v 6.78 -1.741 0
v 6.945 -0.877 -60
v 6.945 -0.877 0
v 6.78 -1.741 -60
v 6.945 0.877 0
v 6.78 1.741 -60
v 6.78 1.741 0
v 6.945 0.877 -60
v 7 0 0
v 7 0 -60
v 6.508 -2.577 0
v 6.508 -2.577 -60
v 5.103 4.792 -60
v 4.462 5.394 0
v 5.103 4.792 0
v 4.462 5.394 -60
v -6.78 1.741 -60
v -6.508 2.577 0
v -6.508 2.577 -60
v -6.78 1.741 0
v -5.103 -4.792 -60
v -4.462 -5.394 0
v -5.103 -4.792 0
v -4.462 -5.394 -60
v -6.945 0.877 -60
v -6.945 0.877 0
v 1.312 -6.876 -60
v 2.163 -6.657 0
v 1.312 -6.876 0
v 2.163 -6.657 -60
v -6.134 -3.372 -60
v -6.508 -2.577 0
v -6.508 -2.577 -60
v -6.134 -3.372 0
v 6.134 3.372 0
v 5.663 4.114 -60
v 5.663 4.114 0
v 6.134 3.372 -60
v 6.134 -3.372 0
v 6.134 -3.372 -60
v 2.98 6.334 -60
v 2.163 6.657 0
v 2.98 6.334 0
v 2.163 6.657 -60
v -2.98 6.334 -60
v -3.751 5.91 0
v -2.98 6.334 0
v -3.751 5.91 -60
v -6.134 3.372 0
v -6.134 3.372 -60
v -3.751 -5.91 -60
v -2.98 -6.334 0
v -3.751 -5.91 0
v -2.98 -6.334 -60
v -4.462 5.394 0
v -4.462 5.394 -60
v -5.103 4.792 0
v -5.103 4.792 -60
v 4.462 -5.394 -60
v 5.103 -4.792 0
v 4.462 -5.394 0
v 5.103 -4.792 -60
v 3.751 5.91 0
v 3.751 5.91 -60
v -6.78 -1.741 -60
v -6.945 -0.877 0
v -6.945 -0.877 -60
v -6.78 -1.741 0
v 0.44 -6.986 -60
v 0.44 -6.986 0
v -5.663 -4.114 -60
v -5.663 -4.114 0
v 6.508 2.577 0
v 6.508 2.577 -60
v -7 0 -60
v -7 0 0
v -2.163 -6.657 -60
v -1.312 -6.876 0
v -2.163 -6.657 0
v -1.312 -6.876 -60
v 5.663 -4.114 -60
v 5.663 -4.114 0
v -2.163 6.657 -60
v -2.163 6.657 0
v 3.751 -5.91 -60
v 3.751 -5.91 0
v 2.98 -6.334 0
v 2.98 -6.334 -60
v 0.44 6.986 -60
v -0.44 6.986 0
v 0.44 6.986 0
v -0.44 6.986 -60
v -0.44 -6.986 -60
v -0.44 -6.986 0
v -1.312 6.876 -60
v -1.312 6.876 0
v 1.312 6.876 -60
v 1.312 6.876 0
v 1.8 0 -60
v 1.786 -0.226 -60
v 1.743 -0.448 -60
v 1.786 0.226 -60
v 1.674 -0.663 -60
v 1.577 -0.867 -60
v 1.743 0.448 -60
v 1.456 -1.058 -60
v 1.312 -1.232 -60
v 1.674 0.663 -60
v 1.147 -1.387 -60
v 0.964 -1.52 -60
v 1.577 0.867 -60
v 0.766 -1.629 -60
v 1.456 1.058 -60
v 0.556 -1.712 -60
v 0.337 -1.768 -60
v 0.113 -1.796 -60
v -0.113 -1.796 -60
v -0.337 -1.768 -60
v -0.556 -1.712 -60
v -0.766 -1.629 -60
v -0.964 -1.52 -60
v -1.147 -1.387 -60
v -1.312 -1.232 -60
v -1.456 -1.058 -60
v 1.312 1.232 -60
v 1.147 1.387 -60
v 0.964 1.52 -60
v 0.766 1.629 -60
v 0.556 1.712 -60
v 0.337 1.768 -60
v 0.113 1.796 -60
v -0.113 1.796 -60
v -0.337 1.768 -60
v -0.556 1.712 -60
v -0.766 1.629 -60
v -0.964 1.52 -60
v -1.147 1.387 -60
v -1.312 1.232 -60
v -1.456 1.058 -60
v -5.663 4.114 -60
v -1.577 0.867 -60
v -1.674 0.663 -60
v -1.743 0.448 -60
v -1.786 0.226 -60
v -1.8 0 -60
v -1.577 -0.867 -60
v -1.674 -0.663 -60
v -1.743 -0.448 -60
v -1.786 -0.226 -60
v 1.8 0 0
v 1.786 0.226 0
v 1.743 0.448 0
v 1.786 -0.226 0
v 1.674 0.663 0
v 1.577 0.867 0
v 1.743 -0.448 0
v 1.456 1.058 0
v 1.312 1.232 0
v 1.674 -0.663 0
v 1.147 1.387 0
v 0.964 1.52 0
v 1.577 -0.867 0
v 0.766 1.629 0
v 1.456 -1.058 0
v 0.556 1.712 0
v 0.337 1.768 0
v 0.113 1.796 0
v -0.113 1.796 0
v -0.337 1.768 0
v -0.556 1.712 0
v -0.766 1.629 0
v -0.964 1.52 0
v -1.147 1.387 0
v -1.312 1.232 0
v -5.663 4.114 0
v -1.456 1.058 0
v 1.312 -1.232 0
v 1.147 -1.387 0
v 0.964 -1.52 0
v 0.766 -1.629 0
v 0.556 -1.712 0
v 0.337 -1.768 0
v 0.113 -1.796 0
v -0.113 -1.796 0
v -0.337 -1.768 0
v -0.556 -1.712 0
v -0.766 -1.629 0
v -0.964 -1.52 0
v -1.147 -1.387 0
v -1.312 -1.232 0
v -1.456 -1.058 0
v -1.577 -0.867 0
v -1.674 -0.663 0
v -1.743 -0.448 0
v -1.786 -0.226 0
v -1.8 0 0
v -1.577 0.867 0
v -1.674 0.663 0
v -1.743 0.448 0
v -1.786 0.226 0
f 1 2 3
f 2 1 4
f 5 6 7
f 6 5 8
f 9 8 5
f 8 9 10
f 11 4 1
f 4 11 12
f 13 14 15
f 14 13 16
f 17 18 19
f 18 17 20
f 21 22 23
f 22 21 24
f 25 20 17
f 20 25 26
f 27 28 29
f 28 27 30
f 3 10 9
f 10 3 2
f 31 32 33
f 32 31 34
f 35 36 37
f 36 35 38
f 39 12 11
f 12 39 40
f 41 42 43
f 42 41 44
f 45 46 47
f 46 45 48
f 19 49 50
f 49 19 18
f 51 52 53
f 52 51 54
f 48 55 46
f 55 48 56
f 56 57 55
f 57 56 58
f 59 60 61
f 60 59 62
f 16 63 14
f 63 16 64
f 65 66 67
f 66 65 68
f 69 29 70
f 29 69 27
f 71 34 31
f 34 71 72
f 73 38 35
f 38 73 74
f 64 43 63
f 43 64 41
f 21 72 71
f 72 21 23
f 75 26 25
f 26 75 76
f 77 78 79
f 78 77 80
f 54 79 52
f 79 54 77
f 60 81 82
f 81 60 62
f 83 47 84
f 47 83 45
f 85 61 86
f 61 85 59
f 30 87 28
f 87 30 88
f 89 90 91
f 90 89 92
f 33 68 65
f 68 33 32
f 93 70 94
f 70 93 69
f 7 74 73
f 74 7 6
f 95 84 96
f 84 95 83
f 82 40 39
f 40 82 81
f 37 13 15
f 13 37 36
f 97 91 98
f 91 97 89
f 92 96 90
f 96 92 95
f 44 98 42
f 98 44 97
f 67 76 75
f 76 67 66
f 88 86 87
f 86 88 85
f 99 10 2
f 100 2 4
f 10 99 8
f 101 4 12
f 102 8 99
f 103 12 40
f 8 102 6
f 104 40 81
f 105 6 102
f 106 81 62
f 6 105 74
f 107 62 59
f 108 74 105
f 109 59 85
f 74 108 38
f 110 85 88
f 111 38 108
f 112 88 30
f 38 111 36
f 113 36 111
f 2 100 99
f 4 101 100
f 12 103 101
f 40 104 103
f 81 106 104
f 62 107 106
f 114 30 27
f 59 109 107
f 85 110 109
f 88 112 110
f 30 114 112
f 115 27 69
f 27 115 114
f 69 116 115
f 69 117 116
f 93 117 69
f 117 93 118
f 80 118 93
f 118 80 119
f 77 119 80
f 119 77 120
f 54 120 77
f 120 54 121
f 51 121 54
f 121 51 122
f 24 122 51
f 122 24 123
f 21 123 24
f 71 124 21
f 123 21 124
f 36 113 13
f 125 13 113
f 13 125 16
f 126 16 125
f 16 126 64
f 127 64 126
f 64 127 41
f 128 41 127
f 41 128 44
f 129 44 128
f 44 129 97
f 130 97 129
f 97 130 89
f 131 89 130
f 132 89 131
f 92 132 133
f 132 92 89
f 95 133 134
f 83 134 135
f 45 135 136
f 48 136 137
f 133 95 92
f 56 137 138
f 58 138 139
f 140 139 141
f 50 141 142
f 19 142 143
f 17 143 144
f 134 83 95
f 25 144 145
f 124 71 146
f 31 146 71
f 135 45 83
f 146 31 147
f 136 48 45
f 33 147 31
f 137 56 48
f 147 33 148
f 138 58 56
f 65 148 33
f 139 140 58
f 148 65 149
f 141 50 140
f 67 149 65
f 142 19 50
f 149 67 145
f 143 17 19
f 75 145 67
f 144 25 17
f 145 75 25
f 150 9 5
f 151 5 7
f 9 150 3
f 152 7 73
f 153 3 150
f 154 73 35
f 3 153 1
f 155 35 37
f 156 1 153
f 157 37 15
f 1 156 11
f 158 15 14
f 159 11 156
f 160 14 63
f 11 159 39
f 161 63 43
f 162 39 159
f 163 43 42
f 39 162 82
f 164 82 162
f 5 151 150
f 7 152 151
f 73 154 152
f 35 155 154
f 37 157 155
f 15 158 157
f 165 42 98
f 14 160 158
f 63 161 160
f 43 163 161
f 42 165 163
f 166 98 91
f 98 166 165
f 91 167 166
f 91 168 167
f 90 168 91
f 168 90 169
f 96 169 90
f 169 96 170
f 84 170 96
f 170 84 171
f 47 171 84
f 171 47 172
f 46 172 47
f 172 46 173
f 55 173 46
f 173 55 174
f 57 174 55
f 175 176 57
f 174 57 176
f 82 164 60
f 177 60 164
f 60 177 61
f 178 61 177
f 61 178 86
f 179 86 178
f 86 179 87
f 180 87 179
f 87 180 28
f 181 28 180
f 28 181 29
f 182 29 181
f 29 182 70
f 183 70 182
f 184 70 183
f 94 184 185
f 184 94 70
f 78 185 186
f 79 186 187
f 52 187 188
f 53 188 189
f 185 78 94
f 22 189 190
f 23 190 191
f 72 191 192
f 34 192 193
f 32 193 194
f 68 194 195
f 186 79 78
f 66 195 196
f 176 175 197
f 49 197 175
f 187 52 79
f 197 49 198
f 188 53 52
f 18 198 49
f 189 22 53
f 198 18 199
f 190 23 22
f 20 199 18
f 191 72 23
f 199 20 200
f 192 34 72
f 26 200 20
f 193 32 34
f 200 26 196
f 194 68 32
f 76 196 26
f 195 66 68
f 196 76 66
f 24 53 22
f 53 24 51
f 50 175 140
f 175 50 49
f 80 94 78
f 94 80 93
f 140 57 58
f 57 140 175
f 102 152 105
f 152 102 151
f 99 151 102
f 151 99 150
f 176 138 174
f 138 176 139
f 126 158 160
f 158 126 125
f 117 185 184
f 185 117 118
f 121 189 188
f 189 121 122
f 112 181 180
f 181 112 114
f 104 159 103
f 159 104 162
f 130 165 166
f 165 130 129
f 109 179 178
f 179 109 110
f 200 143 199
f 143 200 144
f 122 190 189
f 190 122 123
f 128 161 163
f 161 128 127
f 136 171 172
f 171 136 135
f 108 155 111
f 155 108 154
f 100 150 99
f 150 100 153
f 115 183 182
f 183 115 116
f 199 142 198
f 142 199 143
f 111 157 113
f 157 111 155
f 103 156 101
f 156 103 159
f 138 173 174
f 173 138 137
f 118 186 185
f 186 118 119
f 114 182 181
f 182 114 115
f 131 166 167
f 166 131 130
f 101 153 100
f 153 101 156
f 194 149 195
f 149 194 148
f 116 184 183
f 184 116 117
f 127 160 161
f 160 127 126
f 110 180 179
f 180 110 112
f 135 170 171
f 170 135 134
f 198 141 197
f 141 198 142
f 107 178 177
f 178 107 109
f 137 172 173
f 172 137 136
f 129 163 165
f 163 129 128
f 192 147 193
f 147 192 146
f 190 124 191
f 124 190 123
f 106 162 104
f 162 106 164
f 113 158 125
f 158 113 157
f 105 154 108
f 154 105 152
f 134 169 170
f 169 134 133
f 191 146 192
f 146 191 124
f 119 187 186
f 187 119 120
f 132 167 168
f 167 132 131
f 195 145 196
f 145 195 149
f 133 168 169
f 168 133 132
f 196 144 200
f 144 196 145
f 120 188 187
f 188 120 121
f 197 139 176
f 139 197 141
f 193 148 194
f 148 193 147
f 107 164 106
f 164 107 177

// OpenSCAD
$fn = 50;


difference() {
	union() {
		translate(v = [0, 0, -60.0000000000]) {
			cylinder(h = 60, r = 7.0000000000);
		}
		cylinder(h = 0, r = 10.0000000000);
	}
	union() {
		#translate(v = [0, 0, -60]) {
			cylinder(h = 60, r = 1.8000000000);
		}
	}
}
